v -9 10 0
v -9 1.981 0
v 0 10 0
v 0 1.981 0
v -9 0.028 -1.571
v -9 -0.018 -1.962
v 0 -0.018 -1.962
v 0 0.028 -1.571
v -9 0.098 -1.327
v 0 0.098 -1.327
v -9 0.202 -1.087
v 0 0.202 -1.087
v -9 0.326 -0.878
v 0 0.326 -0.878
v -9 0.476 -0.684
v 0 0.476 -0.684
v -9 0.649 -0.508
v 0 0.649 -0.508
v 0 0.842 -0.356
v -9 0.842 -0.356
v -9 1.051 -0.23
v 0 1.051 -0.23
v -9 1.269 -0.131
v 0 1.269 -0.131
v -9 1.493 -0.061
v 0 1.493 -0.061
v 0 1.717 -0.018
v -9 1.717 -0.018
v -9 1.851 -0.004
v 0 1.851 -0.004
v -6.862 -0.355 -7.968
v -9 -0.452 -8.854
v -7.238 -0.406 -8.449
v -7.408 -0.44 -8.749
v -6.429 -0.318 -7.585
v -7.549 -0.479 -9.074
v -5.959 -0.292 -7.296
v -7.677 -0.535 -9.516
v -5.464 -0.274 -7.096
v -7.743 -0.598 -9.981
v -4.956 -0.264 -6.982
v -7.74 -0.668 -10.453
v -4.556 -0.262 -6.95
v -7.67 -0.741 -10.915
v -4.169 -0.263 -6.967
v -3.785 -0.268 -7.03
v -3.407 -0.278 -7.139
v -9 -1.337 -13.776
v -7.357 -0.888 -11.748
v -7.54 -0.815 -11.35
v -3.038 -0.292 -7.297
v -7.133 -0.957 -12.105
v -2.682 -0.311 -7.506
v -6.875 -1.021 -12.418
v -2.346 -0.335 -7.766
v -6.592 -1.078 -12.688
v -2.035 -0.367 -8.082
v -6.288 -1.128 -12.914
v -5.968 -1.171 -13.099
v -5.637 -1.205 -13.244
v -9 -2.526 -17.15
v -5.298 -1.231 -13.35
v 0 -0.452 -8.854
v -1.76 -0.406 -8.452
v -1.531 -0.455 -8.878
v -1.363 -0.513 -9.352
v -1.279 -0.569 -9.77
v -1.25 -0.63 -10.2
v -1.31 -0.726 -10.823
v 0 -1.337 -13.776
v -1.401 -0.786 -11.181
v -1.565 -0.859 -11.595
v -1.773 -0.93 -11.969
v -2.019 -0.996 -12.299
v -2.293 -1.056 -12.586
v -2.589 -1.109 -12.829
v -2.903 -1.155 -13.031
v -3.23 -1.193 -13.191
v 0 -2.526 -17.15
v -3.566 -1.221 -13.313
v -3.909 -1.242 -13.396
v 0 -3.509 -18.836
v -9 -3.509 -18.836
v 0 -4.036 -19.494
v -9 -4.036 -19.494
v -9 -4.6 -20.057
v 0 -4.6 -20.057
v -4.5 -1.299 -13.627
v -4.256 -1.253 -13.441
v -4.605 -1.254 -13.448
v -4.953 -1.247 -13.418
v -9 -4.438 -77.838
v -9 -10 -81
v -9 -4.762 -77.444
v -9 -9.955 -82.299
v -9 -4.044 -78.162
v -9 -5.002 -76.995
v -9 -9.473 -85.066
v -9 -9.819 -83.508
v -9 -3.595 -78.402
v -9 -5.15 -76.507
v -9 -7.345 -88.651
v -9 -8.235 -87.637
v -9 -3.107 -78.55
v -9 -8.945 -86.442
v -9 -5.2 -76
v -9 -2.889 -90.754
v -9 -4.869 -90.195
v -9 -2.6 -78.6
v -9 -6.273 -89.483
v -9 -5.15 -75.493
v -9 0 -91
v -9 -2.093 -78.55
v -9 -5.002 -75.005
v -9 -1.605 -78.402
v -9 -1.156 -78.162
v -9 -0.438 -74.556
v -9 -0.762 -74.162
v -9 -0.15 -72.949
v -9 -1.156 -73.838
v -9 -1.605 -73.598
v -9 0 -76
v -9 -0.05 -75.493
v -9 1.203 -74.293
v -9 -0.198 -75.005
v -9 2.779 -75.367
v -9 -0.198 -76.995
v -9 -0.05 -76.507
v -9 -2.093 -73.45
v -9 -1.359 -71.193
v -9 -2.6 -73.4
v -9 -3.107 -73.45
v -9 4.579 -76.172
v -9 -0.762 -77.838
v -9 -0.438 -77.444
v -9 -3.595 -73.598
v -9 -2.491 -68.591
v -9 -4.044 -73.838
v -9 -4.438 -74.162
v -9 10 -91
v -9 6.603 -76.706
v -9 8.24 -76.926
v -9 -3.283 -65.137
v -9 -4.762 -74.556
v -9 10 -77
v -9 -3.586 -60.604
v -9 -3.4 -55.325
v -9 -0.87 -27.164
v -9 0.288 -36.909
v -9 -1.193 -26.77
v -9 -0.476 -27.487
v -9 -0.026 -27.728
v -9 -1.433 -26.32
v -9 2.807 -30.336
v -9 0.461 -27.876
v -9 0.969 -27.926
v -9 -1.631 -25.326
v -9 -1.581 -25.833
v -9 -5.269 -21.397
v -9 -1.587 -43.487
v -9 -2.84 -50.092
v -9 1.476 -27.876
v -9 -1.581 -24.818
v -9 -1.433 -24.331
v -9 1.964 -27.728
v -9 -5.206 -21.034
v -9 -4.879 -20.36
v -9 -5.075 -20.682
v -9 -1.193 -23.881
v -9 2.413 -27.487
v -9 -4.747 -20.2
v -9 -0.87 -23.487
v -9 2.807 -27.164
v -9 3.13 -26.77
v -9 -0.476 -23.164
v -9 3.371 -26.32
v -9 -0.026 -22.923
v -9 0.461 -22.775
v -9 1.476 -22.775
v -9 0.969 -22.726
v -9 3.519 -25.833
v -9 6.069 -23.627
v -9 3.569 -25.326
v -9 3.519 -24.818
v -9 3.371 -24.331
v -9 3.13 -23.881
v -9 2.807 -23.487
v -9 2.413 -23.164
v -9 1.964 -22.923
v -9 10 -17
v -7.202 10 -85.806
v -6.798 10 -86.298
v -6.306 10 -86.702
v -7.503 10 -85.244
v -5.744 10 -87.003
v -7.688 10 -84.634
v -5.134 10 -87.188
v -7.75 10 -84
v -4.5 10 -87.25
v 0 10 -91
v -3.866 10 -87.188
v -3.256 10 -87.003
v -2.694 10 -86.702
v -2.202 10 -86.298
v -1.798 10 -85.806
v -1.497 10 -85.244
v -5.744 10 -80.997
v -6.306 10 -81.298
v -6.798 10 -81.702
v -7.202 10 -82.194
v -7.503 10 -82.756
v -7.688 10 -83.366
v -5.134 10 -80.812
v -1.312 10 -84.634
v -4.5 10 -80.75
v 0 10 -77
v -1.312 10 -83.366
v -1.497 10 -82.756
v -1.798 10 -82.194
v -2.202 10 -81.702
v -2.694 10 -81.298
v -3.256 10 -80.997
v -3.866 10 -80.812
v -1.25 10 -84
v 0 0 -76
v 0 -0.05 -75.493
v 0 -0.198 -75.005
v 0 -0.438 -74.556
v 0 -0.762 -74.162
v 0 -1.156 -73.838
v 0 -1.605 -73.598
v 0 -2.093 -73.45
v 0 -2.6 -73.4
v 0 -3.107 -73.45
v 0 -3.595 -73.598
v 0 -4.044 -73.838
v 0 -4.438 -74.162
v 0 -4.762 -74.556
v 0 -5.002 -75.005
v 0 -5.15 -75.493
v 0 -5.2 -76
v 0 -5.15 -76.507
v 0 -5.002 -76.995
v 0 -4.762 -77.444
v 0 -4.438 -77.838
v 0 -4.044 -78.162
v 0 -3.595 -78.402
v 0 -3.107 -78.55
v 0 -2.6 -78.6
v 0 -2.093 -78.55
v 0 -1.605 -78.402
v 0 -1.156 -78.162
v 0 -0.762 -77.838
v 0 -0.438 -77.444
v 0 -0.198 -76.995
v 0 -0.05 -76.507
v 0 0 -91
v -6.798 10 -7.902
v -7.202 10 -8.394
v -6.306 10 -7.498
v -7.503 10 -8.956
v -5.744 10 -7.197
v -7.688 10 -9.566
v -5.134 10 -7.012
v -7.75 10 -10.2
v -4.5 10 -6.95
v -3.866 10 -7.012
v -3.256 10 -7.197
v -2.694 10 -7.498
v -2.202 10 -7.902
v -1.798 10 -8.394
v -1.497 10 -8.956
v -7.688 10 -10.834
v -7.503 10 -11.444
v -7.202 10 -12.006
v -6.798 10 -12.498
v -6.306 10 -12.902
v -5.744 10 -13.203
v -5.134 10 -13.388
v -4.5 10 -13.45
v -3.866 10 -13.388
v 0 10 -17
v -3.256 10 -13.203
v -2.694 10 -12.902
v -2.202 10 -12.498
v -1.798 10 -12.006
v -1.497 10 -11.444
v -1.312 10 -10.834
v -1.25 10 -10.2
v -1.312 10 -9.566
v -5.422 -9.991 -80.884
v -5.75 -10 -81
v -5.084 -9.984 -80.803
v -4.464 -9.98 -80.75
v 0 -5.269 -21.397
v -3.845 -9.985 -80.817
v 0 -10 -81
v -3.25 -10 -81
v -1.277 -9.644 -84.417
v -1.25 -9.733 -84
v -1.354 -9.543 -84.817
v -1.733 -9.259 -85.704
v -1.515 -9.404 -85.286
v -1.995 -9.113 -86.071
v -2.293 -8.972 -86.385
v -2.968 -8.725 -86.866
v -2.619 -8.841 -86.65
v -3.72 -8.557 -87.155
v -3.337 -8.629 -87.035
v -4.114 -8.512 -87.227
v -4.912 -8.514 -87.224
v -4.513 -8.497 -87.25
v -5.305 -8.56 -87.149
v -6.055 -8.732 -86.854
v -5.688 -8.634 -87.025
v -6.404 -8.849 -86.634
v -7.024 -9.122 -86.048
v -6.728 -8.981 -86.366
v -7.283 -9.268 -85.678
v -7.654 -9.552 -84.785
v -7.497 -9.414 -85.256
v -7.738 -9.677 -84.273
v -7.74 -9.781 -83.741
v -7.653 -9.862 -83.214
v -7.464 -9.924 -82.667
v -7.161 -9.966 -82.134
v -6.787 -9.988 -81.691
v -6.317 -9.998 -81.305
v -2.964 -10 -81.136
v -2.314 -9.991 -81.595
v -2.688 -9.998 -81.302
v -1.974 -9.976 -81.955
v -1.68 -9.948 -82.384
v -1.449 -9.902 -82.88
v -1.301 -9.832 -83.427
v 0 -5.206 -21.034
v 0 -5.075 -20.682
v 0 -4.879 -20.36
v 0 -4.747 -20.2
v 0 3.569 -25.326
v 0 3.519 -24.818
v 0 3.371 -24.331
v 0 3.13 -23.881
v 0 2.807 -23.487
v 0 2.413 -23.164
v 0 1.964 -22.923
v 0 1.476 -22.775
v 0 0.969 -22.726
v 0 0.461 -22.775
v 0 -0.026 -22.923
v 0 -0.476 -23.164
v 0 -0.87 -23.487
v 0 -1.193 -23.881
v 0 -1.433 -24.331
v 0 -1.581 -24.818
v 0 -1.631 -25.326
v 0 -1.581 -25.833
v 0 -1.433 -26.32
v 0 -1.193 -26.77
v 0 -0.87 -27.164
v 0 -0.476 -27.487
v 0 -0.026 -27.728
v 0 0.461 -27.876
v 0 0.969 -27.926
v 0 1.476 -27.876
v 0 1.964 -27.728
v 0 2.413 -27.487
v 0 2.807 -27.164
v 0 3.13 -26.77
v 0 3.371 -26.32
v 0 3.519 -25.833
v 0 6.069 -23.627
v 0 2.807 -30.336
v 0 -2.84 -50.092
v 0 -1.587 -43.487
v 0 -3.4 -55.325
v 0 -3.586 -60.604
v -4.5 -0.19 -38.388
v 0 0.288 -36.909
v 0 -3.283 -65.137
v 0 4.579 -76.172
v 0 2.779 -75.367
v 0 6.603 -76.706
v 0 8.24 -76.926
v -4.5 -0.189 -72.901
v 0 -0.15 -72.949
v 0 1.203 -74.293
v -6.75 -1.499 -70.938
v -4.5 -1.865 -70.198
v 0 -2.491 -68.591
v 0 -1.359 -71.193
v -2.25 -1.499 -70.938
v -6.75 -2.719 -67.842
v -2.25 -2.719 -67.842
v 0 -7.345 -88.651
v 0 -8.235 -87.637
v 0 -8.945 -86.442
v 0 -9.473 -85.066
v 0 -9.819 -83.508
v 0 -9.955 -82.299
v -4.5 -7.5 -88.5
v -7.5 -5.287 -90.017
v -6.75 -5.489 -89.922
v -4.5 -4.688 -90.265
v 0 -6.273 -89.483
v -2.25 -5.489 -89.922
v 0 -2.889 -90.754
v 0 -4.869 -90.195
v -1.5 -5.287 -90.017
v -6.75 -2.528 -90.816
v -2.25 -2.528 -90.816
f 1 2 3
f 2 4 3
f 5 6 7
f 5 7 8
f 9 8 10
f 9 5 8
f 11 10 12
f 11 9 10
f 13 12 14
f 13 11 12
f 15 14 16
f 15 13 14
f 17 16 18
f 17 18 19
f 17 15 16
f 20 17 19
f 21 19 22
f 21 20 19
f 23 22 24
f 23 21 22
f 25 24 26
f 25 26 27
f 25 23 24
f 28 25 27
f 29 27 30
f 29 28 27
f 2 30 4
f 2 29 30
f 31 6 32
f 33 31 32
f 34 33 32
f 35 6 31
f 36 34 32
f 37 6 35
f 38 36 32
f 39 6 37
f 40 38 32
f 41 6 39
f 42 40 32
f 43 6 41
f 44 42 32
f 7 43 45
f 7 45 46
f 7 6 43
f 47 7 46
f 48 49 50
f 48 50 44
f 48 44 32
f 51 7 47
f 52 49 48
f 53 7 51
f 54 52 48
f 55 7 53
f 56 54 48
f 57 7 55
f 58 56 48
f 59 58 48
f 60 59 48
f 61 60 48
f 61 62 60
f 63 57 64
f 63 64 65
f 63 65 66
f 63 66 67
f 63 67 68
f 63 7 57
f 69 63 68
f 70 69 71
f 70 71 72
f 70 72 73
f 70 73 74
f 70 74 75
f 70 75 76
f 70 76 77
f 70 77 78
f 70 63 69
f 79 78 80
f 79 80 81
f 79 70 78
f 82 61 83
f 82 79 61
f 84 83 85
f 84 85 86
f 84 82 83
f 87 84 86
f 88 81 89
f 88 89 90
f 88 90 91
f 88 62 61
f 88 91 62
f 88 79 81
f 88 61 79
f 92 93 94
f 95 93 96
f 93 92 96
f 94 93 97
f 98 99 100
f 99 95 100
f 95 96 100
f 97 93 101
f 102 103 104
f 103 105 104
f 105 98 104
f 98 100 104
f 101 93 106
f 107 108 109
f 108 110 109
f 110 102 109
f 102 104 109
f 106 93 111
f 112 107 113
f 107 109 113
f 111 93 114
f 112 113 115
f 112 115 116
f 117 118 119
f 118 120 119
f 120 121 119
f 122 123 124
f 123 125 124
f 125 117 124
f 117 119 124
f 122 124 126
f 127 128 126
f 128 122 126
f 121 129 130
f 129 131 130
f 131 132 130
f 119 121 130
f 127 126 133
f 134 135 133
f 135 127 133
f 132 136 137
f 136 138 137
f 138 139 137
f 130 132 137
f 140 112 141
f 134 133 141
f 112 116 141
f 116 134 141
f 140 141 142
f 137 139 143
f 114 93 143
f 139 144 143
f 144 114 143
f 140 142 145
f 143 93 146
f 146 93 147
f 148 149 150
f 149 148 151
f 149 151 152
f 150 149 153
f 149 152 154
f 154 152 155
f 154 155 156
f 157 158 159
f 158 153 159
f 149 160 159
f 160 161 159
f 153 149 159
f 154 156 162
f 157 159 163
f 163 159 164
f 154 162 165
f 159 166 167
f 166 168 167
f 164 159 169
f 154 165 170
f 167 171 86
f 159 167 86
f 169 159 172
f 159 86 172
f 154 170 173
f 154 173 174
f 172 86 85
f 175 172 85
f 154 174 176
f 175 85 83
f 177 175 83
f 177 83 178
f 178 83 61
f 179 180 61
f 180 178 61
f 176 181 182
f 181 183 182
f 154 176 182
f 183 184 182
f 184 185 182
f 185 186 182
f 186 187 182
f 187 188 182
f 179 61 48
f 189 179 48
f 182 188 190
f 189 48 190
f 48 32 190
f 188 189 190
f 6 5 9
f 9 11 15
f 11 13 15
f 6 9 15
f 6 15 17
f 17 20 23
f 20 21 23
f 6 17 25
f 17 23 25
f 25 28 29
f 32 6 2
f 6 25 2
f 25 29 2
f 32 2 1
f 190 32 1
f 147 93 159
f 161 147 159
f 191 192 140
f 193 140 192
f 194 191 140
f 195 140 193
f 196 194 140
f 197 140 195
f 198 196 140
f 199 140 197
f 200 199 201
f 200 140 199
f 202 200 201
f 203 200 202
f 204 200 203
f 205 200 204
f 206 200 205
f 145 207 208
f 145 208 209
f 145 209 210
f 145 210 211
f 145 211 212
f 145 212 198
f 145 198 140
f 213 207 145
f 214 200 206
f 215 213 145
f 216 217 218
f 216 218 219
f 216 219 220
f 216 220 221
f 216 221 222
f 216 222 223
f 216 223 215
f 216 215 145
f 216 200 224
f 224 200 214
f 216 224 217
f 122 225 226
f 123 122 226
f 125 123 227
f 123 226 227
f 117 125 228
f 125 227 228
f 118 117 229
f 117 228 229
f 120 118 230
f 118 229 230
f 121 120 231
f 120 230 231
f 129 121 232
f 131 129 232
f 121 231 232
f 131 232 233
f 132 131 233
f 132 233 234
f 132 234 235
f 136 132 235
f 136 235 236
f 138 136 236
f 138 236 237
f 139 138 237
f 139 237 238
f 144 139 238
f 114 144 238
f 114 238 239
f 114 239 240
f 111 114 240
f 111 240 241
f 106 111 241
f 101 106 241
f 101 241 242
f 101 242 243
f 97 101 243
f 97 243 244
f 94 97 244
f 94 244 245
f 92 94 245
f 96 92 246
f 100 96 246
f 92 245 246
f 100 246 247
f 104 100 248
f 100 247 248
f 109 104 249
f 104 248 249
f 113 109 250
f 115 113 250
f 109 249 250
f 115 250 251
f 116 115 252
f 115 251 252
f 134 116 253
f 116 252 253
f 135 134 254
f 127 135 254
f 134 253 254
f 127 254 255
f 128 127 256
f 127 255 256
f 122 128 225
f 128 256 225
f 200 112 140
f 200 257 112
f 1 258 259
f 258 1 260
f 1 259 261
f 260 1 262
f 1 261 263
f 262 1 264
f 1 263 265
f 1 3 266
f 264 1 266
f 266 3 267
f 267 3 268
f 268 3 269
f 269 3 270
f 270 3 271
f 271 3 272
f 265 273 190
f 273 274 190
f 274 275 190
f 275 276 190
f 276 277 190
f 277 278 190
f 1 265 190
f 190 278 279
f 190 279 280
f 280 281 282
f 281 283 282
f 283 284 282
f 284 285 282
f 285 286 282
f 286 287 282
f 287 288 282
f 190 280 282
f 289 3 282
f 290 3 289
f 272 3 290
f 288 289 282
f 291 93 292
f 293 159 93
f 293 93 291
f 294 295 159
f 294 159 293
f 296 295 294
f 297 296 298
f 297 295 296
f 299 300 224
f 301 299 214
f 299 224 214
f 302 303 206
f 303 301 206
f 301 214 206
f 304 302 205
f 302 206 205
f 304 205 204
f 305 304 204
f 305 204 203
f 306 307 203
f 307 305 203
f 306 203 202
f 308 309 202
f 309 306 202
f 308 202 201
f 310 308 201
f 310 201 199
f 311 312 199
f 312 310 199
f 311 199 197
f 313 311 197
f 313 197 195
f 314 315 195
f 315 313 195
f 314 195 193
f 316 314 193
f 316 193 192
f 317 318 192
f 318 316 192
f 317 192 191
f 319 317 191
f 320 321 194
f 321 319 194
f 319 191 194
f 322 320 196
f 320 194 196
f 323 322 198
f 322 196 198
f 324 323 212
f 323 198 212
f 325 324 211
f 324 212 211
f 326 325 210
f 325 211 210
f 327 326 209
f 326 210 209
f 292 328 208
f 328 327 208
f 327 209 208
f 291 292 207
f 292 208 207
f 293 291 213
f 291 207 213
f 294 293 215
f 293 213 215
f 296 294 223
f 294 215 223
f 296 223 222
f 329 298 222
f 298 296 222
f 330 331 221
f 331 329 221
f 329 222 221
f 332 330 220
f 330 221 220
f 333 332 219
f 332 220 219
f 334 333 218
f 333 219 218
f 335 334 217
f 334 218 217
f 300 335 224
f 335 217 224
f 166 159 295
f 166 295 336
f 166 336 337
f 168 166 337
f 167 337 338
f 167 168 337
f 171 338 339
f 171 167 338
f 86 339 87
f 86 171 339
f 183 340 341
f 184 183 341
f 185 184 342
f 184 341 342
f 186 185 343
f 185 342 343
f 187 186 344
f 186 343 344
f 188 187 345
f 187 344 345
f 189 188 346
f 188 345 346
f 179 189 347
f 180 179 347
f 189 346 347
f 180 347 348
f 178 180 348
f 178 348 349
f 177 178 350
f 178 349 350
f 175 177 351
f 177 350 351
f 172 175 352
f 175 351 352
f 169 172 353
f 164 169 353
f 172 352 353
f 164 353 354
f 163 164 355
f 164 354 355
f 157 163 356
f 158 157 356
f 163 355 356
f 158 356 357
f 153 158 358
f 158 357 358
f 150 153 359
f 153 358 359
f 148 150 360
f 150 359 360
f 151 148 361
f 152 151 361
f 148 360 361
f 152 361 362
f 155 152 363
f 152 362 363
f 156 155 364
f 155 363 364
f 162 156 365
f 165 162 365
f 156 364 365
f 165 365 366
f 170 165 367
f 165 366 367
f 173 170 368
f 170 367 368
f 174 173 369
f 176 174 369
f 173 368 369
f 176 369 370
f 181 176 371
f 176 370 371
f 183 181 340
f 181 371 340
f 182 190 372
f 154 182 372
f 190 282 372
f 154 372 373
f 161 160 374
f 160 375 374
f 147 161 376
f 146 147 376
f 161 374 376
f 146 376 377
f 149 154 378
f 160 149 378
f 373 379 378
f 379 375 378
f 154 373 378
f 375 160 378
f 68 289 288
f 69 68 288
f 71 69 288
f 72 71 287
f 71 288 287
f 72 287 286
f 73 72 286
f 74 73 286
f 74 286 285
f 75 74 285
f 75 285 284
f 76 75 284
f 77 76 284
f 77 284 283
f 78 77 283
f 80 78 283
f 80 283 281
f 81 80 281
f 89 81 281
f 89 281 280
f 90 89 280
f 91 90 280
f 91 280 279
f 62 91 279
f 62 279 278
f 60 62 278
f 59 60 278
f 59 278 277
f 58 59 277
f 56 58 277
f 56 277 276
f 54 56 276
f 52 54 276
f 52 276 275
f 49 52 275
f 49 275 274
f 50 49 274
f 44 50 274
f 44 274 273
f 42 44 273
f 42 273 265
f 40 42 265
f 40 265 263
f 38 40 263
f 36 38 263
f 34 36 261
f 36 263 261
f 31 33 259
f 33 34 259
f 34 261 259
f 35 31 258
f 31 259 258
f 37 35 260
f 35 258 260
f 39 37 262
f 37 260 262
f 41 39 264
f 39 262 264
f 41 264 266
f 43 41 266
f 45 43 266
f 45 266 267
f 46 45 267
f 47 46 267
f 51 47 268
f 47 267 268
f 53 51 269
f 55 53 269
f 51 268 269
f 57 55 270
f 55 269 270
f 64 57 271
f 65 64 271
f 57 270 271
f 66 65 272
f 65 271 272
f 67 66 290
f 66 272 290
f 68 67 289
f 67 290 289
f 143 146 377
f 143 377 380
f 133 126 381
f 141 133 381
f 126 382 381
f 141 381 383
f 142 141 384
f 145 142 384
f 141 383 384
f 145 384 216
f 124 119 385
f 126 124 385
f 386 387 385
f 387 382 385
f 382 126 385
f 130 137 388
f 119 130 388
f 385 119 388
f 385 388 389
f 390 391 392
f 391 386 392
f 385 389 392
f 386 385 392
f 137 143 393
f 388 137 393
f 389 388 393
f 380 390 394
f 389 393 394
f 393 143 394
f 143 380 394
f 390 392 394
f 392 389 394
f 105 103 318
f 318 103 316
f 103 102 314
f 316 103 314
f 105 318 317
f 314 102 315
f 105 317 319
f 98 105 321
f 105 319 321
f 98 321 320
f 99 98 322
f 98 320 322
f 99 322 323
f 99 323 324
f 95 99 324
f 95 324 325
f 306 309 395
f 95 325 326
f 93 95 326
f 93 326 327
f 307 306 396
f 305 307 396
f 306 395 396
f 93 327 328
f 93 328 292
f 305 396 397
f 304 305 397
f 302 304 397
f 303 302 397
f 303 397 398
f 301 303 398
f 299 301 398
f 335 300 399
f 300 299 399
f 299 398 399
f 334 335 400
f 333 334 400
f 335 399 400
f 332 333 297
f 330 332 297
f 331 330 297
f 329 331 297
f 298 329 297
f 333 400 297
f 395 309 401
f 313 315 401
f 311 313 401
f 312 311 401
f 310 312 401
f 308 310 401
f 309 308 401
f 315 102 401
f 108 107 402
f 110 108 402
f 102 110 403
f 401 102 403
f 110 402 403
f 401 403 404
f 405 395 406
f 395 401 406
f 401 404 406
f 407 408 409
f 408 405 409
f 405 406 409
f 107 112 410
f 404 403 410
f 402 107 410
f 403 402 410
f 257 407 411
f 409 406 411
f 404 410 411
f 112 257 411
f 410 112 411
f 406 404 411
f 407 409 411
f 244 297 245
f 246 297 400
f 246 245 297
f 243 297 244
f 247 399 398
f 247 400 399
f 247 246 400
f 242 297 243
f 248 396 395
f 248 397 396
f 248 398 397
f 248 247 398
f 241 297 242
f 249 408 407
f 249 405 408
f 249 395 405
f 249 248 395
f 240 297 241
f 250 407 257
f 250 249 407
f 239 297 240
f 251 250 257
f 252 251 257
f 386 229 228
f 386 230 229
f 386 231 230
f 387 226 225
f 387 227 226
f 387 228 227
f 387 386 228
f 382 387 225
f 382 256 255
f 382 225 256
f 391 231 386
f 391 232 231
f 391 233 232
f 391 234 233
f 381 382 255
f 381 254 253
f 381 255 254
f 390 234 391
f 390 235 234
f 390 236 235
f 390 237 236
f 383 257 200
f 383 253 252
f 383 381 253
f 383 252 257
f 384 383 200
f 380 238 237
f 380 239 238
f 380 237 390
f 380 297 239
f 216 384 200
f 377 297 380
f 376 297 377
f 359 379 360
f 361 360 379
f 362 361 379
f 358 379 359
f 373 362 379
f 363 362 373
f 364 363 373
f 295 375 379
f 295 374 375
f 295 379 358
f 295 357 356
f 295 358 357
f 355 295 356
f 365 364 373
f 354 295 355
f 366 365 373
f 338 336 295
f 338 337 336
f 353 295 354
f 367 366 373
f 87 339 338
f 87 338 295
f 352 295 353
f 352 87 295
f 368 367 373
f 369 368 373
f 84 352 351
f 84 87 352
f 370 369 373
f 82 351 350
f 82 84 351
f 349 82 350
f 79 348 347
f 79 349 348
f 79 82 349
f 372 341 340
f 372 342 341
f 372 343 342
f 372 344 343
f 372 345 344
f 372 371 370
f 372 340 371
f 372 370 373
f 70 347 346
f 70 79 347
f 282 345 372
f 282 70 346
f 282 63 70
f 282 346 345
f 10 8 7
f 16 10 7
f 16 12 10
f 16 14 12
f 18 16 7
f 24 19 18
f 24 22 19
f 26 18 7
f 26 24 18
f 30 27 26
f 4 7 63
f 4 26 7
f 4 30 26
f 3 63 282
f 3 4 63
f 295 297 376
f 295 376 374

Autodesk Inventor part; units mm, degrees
ref_plane "YZ Plane" through (0, 0, 0) normal (1, 0, 0) x (0, 1, 0)
ref_plane "XZ Plane" through (0, 0, 0) normal (0, 1, 0) x (-1, 0, 0)
ref_plane "XY Plane" through (0, 0, 0) normal (0, 0, 1) x (1, 0, 0)
sketch "Boceto3" plane through (0, 0, 0) normal (1, 0, 0) x (0, 1, 0)
  line L0 (0, -90) -> (0, -91)
  line L1 (0, -91) -> (10, -91)
  line L2 (10, -91) -> (10, -77)
  line L3 (-3.586, -60.6037) -> (-3.586, -77) construction
  line L4 (-3.586, -77) -> (10, -77) construction
  spline S0 degree 2 poles (-3.586, -60.6037) (-3.586, -77) (10, -77) knots 1 1 1 2 2 2
  line L5 (0, 0) -> (10, 0)
  line L6 (10, 0) -> (10, -17)
  line L7 (10, -17) -> (-3.586, -37.9742) construction
  line L8 (-3.586, -37.9742) -> (-3.586, -60.6037) construction
  spline S1 degree 2 poles (10, -17) (-3.586, -37.9742) (-3.586, -60.6037) knots 1 1 1 2 2 2
  line L9 (0, -91) -> (-10, -91) construction
  line L10 (-10, -91) -> (-10, -81) construction
  spline S2 degree 2 poles (0, -91) (-10, -91) (-10, -81) knots 1 1 1 2 2 2
  line L11 (-3.586, -76) -> (-2.6, -76)
  circle A0 centre (-2.6, -76) radius 2.6
  circle A1 centre (0.9686, -25.3255) radius 2.6
  line L12 (0, 0) -> (0, -17) construction
  line L13 (0, -17) -> (-5.2, -20.5234) construction
  spline S3 degree 2 poles (0, 0) (0, -17) (-5.2, -20.5234) knots 1 1 1 2 2 2
  line L14 (-5.2, -20.5234) -> (-10, -81)
  dimension "d36" = 1
  dimension "d40" = 10
  dimension "d41" = 17
extrude "Extrusión4" add sketch "Boceto3" against normal blind 9
fillet "Empalme1" radius 2 1 edges at (-4.5, -5.2, -20.5234)
fillet "Empalme2" radius 2 1 edges at (-4.5, 0, 0)
sketch "Boceto4" plane through (0, 10, -77) normal (0, 1, 0) x (1, 0, 0)
  line L0 (0, 14) -> (0, 0) projected
  line L1 (0, 14) -> (-4.5, 14)
  line L2 (0, 14) -> (-9, 14) projected
  point P0 (0, -77)
sketch "Boceto5" plane through (0, 10, 0) normal (0, 1, 0) x (1, 0, 0)
  point P0 (0, 0)
sketch "Boceto7" plane through (0, 10, -77) normal (0, 1, 0) x (1, 0, 0)
  line L0 (0, 14) -> (-9, 14) projected
  line L1 (-4.5, 14) -> (-4.5, 7)
  circle A0 centre (-4.5, 7) radius 3.25
  line L2 (-4.5, 7) -> (-4.5, -66.8)
  circle A1 centre (-4.5, -66.8) radius 3.25
  point P0 (0, -77)
  dimension "d67" = 7
  dimension "d68" = 6.5
  dimension "d69" = 73.8
  dimension "d70" = 6.5
extrude "Extrusión7" cut sketch "Boceto7" against normal blind 20
sketch "Boceto8" plane through (-9, -10, -81) normal (0, -0.9969, 0.0791) x (1, 0, 0)
  point P0 (9, 81.5373)
sketch "Boceto9" plane through (0, 10, 0) normal (0, 1, 0) x (1, 0, 0)
  point P0 (0, 0)
